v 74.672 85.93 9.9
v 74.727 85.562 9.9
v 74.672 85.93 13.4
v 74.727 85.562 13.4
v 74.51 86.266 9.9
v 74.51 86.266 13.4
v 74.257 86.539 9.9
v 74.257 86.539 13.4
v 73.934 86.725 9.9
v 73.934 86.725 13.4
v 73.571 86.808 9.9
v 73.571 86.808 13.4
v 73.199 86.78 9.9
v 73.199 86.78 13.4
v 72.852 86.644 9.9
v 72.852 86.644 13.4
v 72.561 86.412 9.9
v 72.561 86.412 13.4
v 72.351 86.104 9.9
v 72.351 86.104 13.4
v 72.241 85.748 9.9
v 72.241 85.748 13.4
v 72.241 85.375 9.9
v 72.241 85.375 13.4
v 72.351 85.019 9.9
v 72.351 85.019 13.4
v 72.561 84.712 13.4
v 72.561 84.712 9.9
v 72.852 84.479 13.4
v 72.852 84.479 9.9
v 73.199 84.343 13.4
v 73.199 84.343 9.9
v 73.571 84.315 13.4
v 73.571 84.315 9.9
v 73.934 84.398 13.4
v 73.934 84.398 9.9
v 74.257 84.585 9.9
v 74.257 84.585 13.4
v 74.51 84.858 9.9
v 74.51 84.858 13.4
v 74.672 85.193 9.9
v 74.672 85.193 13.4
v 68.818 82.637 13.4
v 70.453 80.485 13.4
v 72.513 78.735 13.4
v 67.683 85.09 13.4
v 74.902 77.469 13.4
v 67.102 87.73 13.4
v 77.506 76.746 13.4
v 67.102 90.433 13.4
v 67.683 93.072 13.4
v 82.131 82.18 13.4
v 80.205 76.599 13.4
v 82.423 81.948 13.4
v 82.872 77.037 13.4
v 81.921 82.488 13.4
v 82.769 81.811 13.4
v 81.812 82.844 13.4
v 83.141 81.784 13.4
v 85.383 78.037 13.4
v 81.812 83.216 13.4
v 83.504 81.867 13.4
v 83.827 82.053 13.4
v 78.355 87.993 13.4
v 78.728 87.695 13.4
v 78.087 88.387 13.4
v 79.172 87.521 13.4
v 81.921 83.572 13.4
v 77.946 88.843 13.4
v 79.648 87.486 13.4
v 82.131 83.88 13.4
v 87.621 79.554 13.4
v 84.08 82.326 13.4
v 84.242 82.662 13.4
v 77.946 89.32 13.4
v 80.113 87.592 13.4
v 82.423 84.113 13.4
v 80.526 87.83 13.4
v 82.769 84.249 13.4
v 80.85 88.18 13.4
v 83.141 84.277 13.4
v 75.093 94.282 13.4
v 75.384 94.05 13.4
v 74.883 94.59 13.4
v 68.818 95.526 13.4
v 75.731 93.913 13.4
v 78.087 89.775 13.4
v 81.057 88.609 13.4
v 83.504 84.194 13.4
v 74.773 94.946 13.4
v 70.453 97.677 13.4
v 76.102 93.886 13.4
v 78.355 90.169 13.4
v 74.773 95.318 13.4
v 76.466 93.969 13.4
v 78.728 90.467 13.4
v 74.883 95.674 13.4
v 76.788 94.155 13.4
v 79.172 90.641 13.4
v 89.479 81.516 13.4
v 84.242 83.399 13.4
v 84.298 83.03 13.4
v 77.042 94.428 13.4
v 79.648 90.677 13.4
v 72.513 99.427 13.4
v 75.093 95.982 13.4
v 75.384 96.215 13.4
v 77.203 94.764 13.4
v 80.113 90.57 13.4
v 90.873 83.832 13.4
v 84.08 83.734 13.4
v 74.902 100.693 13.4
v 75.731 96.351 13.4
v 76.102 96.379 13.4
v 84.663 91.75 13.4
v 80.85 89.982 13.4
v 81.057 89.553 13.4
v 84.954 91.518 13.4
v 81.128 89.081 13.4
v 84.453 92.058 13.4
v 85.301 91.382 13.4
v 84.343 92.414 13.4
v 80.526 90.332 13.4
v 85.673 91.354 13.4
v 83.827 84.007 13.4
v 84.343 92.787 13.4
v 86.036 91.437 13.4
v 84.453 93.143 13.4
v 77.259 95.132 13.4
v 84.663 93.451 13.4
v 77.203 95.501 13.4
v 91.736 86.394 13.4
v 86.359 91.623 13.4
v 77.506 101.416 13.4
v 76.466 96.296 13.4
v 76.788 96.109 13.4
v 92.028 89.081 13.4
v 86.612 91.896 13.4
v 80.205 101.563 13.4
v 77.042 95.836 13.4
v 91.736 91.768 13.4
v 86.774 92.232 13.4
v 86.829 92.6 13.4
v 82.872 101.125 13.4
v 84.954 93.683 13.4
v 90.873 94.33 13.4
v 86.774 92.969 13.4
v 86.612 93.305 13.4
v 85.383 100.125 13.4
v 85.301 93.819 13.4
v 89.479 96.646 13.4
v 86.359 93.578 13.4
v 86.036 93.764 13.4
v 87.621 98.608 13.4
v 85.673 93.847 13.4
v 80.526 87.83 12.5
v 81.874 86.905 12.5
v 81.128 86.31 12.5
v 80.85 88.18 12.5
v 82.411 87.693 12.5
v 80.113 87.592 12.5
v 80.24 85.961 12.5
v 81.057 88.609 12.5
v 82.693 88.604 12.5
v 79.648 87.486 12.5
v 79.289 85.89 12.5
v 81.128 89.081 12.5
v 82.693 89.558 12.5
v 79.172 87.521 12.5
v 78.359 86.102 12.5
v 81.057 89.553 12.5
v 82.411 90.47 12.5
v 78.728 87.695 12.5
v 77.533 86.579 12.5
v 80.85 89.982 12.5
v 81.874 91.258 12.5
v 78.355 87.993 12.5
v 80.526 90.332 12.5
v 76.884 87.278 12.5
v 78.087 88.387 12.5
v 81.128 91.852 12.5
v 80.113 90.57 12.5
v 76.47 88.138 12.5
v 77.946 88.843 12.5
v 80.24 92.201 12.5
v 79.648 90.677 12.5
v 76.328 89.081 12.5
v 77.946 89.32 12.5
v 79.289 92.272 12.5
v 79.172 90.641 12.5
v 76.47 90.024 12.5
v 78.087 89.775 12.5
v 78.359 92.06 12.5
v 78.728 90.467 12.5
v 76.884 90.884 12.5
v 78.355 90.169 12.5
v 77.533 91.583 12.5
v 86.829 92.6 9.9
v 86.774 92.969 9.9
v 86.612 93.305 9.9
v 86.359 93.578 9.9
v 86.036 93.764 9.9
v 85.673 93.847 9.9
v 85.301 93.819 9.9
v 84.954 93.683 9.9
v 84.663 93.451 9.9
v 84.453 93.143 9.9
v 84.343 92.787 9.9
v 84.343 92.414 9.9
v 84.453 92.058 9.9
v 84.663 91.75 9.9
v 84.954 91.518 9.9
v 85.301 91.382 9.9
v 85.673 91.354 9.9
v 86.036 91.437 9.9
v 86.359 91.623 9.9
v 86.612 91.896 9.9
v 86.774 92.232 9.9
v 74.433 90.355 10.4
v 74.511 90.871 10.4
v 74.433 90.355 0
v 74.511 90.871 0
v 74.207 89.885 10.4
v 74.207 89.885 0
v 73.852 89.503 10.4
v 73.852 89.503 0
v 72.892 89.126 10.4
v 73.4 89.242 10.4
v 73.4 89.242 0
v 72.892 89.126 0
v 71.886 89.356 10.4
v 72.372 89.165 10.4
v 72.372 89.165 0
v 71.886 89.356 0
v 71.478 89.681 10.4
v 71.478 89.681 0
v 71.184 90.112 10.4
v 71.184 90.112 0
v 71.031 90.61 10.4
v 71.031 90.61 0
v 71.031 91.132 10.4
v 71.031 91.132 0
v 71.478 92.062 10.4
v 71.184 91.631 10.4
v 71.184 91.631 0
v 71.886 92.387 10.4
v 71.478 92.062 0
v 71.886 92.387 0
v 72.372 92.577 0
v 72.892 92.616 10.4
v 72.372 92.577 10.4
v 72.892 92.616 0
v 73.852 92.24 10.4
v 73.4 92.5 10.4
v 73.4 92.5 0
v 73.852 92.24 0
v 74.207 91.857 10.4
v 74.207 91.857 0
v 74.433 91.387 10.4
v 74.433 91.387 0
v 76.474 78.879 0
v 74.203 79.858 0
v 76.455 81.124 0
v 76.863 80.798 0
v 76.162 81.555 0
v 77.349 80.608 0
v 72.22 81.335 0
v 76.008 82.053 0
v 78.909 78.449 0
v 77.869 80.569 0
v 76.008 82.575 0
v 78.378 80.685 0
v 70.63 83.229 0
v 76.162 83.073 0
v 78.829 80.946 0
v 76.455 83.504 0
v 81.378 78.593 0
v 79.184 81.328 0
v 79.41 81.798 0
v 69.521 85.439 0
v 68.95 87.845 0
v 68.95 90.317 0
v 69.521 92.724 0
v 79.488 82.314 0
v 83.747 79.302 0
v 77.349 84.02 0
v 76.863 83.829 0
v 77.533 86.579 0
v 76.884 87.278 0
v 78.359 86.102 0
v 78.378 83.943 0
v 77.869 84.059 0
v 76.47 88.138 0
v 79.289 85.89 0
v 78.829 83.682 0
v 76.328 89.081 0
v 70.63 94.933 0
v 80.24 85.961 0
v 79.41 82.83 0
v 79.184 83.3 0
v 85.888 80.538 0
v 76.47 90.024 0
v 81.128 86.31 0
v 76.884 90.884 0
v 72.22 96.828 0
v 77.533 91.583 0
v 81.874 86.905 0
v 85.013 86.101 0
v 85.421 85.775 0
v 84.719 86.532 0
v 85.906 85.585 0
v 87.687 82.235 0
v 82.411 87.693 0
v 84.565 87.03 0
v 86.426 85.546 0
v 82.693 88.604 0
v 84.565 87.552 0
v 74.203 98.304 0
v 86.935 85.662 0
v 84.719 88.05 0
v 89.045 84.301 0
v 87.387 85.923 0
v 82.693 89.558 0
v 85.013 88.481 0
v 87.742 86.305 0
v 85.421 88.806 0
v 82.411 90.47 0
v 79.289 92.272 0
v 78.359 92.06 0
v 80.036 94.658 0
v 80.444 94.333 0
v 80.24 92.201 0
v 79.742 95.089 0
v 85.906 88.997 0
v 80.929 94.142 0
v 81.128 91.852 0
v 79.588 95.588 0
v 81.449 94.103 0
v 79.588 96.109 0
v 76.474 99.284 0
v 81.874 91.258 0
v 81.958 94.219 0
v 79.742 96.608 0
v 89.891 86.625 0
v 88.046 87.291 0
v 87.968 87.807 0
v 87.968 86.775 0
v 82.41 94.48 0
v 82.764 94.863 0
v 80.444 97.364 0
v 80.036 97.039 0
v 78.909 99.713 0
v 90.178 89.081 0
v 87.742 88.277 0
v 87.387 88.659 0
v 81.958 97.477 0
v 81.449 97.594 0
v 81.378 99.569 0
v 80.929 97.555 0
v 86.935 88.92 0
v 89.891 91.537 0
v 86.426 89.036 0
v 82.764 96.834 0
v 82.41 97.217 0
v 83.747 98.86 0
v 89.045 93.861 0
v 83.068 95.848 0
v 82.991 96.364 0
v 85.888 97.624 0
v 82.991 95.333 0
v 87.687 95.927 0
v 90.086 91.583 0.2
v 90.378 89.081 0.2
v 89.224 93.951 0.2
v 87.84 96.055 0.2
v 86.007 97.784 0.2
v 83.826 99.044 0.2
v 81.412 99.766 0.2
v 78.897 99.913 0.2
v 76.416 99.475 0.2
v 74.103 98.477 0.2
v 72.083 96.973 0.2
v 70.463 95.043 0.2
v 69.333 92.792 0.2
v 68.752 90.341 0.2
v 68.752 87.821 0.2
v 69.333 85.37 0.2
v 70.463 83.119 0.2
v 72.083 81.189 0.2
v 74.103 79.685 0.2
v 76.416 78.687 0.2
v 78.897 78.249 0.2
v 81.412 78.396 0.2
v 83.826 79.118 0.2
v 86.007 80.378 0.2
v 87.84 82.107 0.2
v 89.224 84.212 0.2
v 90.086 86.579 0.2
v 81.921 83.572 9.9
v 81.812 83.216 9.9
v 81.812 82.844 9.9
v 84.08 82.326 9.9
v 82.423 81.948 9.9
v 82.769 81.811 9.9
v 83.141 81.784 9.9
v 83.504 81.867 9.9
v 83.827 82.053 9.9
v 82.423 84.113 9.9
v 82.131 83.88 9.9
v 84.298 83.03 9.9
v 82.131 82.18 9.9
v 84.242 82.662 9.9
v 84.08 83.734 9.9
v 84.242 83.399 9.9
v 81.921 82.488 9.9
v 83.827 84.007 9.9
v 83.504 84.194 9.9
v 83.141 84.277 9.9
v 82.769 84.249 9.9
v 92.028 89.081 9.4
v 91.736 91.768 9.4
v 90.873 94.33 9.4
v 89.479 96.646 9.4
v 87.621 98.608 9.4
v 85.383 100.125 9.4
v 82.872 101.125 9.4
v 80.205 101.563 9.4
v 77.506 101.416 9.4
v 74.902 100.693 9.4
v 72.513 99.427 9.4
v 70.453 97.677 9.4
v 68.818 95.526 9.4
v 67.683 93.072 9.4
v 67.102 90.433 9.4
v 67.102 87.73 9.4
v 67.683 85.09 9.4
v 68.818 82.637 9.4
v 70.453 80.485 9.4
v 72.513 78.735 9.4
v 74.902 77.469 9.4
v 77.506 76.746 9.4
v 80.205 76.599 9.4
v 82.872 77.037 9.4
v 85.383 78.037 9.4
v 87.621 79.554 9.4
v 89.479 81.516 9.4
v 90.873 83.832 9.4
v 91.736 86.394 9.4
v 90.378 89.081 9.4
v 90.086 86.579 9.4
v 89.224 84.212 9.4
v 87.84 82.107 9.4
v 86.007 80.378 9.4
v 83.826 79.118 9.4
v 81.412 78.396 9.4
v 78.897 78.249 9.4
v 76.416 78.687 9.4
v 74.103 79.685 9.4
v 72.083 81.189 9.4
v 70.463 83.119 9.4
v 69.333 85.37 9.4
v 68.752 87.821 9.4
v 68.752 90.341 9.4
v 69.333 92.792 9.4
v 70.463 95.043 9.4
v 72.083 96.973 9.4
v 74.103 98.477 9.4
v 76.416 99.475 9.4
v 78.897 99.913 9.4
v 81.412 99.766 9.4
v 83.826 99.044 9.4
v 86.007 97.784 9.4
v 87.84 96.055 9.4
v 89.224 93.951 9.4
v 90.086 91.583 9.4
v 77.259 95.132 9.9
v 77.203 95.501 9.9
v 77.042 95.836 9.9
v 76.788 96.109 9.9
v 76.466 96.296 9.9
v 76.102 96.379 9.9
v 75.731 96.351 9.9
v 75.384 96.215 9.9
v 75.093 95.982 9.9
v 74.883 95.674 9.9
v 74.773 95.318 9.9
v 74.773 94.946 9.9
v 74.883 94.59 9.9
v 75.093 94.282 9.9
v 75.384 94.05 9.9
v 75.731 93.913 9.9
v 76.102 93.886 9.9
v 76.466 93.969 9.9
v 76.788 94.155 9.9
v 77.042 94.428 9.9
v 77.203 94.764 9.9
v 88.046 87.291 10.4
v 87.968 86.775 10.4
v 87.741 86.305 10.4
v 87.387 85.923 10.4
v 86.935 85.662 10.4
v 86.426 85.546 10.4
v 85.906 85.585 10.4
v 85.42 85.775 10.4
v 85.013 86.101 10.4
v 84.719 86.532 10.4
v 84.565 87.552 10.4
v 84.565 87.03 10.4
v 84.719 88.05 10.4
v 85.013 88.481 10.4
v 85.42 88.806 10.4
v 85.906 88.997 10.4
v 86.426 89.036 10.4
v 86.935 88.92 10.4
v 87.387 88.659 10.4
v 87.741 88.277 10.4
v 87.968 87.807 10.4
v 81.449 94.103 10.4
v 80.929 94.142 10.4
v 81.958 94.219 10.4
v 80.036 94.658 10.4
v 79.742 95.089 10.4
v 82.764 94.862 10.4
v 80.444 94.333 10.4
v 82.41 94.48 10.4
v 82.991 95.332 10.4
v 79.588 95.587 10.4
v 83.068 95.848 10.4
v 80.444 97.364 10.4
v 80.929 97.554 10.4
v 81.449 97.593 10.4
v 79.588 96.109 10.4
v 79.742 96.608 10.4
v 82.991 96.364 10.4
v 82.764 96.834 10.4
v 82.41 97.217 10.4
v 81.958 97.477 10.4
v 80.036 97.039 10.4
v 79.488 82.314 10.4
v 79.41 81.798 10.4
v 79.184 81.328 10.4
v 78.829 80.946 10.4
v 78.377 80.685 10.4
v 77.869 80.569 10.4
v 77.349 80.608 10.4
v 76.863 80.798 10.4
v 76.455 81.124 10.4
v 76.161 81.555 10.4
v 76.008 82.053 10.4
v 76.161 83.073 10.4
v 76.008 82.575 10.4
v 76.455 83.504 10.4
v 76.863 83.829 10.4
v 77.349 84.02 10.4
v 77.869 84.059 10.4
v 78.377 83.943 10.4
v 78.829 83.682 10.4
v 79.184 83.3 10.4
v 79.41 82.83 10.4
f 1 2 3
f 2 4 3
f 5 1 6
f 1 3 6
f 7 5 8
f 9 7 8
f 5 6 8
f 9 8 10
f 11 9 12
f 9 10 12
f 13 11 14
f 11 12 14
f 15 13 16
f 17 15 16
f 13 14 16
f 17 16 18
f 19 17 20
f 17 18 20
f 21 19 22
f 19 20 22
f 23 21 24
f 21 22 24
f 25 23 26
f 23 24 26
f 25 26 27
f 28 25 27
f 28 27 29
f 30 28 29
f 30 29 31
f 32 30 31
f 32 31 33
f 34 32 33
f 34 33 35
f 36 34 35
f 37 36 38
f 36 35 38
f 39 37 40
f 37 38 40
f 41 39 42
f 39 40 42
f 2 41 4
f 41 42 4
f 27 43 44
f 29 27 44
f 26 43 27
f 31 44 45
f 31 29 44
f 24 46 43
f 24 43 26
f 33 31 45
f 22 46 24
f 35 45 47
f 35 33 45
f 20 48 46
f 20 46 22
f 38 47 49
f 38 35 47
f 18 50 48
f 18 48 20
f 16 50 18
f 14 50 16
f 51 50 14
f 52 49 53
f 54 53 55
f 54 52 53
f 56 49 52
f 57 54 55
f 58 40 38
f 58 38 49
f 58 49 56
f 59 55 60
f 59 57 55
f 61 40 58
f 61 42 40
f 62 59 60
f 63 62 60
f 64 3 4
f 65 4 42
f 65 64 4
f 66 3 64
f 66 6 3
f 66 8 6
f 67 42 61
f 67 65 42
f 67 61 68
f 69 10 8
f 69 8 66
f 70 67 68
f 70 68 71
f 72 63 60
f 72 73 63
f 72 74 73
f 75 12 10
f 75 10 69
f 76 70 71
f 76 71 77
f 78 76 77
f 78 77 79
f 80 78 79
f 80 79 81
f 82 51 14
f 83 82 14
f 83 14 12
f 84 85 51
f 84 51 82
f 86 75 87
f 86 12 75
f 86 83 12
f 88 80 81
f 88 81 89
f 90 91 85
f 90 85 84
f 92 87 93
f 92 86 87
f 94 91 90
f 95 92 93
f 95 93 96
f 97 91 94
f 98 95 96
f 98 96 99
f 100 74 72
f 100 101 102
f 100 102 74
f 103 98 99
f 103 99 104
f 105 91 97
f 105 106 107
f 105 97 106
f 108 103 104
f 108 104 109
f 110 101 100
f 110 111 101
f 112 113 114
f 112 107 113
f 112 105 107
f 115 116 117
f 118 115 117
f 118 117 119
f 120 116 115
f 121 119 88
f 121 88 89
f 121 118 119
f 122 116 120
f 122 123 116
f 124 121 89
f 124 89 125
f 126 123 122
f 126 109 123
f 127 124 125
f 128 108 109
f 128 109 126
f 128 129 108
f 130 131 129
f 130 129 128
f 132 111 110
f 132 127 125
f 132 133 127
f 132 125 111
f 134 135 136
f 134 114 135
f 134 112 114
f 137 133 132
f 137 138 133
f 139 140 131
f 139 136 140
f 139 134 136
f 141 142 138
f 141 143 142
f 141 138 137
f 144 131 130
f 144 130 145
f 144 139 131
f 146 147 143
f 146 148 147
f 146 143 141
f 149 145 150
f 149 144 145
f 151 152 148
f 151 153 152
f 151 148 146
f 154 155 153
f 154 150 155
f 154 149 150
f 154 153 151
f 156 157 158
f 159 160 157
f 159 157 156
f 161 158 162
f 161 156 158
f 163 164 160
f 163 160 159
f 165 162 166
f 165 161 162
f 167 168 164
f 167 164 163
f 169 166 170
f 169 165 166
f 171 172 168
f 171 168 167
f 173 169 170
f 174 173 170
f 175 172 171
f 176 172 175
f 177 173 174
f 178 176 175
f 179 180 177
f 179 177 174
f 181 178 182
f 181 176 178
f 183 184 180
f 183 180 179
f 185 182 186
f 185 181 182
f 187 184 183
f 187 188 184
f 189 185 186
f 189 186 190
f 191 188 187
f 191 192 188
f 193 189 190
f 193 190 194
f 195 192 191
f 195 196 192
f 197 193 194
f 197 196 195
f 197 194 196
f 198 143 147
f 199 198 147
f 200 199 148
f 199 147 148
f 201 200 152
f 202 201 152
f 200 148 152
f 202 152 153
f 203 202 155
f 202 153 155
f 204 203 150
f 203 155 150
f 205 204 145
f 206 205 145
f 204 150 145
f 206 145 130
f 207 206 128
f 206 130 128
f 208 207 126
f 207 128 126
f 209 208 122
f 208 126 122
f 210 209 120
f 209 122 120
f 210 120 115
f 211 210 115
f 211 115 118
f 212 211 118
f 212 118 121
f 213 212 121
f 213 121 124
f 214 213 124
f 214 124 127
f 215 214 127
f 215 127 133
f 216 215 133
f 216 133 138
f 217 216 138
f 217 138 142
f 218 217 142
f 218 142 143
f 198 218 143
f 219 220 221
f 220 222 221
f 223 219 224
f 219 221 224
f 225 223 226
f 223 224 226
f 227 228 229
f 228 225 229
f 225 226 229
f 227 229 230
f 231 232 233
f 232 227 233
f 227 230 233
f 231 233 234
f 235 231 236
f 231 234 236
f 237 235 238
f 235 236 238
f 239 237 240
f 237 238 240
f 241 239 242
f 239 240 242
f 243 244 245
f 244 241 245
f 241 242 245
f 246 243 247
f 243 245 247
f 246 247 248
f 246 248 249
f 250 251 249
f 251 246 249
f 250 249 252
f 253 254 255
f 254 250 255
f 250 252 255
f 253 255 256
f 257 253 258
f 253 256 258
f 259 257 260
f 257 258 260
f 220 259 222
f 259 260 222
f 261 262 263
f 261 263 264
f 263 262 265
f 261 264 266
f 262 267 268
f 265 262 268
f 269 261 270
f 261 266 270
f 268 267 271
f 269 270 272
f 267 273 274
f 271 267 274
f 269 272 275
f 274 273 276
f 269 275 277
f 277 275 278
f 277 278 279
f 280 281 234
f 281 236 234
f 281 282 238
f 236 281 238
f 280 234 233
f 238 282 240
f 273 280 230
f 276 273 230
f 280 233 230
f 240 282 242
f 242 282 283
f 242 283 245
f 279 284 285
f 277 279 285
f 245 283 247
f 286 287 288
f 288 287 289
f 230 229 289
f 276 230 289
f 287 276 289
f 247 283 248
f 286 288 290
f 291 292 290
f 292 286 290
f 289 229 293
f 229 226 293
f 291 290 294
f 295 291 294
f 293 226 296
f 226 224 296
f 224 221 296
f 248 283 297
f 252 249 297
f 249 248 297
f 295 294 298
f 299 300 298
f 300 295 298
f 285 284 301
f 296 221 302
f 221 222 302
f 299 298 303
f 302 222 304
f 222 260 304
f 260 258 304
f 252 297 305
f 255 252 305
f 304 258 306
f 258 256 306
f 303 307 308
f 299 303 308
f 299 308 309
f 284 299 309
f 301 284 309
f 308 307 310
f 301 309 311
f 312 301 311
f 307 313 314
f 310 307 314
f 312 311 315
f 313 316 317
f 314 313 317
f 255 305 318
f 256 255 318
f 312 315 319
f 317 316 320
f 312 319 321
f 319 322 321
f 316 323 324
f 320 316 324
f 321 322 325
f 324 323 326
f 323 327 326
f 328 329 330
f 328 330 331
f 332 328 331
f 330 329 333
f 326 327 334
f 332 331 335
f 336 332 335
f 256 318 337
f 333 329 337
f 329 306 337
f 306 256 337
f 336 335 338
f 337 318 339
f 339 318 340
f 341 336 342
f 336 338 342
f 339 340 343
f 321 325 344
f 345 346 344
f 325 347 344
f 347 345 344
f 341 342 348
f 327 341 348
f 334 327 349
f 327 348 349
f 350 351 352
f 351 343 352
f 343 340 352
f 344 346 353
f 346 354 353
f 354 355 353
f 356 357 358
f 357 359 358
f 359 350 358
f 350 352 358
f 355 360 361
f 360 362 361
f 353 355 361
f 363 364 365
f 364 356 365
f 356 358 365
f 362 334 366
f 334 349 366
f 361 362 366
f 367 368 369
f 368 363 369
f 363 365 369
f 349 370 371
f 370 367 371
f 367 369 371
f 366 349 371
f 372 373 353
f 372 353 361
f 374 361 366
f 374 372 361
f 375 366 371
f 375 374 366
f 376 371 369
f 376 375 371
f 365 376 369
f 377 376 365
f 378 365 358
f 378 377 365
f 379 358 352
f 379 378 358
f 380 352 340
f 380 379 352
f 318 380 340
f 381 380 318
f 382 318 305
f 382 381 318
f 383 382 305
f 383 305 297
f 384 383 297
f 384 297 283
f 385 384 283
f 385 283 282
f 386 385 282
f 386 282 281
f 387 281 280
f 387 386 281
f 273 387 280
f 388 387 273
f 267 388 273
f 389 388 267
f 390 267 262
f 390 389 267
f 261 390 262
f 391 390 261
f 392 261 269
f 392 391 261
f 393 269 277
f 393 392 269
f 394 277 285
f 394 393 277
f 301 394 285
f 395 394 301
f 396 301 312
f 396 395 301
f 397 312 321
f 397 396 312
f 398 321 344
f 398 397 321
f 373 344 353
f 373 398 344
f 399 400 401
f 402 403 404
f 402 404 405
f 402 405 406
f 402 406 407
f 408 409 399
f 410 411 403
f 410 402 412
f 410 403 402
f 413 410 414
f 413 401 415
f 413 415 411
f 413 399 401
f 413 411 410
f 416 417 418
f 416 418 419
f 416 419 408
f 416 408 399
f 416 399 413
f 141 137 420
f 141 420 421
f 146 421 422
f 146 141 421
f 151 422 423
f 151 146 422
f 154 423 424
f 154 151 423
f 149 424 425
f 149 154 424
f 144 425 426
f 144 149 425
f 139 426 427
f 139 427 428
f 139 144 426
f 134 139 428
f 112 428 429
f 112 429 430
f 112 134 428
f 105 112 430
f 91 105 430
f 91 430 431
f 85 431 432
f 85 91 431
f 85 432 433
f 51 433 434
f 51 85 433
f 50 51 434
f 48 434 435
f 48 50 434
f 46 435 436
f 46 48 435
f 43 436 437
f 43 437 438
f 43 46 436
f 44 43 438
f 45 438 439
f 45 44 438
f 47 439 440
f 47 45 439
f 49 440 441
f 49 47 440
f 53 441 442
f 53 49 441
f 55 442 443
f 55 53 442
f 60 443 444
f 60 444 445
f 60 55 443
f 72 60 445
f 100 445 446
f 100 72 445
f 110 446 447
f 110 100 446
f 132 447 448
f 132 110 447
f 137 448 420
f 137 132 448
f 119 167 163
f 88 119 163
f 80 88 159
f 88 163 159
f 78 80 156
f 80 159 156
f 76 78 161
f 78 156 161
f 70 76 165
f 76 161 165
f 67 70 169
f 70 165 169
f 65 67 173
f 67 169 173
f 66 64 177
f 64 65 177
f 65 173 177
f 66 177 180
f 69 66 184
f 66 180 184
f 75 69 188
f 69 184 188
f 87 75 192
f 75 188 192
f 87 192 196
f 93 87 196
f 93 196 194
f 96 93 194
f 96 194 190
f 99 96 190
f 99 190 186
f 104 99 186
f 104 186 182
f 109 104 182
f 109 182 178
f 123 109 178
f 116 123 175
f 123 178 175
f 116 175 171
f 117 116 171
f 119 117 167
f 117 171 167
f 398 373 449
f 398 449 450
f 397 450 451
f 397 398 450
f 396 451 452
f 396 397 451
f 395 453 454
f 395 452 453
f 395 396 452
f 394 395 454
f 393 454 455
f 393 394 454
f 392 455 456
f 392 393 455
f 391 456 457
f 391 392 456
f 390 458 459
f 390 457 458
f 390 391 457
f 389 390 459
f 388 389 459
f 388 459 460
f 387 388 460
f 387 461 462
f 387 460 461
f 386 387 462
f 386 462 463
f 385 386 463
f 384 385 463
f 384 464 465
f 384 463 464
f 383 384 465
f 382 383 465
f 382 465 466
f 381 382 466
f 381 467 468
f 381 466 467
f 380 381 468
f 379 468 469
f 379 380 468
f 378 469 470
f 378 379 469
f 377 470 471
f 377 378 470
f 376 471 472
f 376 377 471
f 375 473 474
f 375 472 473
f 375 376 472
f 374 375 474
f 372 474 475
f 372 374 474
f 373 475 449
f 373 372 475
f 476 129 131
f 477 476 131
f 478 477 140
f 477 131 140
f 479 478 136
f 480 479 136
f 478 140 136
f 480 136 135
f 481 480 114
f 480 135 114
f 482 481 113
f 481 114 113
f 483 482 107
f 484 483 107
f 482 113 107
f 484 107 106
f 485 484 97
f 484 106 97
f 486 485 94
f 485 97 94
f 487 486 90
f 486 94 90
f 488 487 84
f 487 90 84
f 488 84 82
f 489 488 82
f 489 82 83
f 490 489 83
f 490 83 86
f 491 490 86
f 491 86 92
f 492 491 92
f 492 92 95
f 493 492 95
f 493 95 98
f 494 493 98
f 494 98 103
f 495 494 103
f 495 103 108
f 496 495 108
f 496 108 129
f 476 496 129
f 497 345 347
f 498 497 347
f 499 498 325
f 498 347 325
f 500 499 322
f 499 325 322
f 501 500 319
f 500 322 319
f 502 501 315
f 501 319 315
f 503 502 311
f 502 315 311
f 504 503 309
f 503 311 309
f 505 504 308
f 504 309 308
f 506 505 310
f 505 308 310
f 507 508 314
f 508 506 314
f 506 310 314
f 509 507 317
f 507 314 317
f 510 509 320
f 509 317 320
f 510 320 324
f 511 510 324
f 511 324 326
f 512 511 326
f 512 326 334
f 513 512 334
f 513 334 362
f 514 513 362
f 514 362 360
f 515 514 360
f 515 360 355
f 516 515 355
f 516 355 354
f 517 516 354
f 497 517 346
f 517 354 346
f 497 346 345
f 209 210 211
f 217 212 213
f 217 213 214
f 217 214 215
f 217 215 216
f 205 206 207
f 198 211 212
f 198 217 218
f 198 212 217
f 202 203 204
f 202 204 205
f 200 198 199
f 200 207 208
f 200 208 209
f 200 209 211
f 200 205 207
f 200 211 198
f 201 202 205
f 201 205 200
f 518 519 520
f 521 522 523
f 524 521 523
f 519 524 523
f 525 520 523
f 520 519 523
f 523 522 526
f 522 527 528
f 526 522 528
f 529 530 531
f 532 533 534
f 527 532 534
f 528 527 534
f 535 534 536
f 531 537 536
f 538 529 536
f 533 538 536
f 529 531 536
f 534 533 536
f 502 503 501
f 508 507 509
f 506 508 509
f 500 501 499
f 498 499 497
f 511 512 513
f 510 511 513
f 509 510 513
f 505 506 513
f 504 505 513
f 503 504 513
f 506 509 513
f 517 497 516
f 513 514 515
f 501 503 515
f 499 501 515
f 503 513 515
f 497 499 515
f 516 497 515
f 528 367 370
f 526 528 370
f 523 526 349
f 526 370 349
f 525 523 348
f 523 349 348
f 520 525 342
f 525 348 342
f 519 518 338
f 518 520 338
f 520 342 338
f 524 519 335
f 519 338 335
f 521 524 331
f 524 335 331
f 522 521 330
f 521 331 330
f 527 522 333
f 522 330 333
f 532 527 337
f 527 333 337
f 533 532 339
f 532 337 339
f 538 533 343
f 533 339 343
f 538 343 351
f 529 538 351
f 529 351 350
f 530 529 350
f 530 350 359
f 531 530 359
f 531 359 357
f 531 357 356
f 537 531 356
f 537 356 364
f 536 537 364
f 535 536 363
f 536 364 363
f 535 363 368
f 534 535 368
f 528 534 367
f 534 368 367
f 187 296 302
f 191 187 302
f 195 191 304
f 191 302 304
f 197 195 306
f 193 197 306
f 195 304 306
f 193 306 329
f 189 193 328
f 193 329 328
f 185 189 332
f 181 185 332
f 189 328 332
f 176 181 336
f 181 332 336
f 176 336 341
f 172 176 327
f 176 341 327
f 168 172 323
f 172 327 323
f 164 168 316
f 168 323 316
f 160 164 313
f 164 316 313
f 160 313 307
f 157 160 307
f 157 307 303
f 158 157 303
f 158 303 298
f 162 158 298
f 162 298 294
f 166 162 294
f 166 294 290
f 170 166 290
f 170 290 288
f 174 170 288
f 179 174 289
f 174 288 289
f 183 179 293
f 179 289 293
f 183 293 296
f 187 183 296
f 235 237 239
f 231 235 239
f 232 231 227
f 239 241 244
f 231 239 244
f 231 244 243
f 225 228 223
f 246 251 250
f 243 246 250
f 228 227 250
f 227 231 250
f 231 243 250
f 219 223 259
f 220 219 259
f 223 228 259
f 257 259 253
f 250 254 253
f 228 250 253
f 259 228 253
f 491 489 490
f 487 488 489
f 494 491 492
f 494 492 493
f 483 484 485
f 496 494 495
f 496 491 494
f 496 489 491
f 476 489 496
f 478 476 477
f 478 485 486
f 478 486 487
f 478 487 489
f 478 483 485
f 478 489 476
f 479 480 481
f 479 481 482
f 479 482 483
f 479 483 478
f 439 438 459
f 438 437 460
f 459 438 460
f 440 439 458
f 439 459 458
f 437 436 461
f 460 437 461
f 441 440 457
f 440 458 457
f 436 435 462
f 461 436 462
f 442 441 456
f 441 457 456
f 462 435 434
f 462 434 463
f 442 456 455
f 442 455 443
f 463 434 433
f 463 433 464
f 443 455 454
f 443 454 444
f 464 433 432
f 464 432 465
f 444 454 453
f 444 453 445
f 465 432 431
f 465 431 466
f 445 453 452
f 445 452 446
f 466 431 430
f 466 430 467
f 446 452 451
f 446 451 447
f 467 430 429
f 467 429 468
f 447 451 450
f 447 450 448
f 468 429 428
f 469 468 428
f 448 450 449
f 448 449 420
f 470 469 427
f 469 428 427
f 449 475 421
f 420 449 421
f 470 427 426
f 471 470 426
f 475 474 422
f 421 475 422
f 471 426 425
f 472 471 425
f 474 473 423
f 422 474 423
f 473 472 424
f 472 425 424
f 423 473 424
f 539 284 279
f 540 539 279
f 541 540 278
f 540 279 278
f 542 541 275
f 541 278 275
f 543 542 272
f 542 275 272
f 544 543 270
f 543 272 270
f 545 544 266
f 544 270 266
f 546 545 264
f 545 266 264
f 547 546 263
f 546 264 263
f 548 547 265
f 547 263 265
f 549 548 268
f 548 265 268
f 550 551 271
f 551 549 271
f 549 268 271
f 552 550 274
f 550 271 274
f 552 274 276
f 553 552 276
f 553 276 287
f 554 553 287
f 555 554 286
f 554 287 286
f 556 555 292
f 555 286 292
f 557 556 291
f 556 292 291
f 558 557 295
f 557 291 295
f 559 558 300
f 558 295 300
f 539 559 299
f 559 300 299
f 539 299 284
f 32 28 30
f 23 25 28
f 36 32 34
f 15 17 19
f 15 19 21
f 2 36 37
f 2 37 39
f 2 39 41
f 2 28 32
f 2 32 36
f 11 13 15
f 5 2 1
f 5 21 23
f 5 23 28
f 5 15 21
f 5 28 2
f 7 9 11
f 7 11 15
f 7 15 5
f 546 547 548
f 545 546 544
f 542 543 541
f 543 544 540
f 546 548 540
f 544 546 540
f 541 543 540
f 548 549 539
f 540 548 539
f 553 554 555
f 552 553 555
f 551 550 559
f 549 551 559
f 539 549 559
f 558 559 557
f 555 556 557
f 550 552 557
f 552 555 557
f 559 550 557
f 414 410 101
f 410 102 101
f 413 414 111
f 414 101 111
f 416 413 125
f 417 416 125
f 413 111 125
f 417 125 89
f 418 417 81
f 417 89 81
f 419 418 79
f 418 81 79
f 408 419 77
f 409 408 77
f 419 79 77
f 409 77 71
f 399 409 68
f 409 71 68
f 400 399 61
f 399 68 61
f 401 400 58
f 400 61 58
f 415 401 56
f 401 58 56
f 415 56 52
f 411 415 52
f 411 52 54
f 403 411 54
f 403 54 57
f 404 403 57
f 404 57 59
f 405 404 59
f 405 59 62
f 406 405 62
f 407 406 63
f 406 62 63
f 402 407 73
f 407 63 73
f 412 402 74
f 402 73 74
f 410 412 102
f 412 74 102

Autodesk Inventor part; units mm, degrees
ref_plane "YZ Plane" through (0, 0, 0) normal (1, 0, 0) x (0, 1, 0)
ref_plane "XZ Plane" through (0, 0, 0) normal (0, 1, 0) x (-1, 0, 0)
ref_plane "XY Plane" through (0, 0, 0) normal (0, 0, 1) x (1, 0, 0)
sketch "스케치1" plane through (0, 0, 0) normal (0, 0, 1) x (1, 0, 0)
  circle A0 centre (77.7382, 82.3139) radius 1.75 projected
  circle A1 centre (72.7611, 90.8713) radius 1.75 projected
  circle A2 centre (86.2956, 87.2909) radius 1.75 projected
  circle A3 centre (81.3185, 95.8484) radius 1.75 projected
  circle A4 centre (79.5283, 89.0811) radius 11.15 projected
  circle A5 centre (79.5283, 89.0811) radius 10.85
  circle A6 centre (79.5283, 89.0811) radius 1.6
  circle A7 centre (79.5283, 89.0811) radius 2.8
  circle A8 centre (79.5283, 89.0811) radius 2.5 projected
  point P0 (0, 0)
  dimension "d0" = 0.3
  dimension "d3" = 3.2
extrude "돌출1" add sketch "스케치1" along normal blind 13.4 contours A5 | A7 | A8
sketch "스케치2" plane through (79.5283, 89.0811, 13.4) normal (0, 0, 1) x (1, 0, 0)
  circle A0 centre (0, 0) radius 10.85 projected
  circle A1 centre (0, 0) radius 12.5
  dimension "d4" = 25
extrude "돌출2" add sketch "스케치2" against normal blind 4
chamfer "모따기1" distance 0.2 angle 45 1 edges at (68.6783, 89.0811, 0)
sketch "스케치3" plane through (79.5283, 89.0811, 0) normal (0, 0, -1) x (-1, 0, 0)
  circle A0 centre (0, 0) radius 1.6 projected
  circle A1 centre (0, 0) radius 10.65 projected
  circle A2 centre (0, 0) radius 3.2
  dimension "d13" = 6.4
extrude "돌출3" cut sketch "스케치3" against normal blind 12.5 contours A2
sketch "스케치5" plane through (79.5283, 89.0811, 13.4) normal (0, 0, 1) x (1, 0, 0)
  circle A0 centre (0, 0) radius 12.5 projected
  circle A1 centre (-1.7902, -6.7672) radius 1.75 projected
  circle A2 centre (-1.7902, -6.7672) radius 1.25
  circle A3 centre (3.5193, -6.051) radius 1.25
  circle A4 centre (6.7672, -1.7902) radius 1.25
  circle A5 centre (6.051, 3.5193) radius 1.25
  circle A6 centre (1.7902, 6.7672) radius 1.25
  circle A7 centre (-3.5193, 6.051) radius 1.25
  circle A8 centre (-6.7672, 1.7902) radius 1.25
  circle A9 centre (-6.051, -3.5193) radius 1.25
  dimension "d18" = 2.5
  dimension "d21" = 360
extrude "돌출5" cut sketch "스케치5" against normal blind 3.5 contours A3 | A5 | A7 | A9
sketch "스케치4" plane through (79.5283, 89.0811, 13.4) normal (0, 0, 1) x (1, 0, 0)
  circle A0 centre (1.7902, 6.7672) radius 1.75 projected
  circle A1 centre (6.7672, -1.7902) radius 1.75 projected
  circle A2 centre (-6.7672, 1.7902) radius 1.75 projected
  circle A3 centre (-1.7902, -6.7672) radius 1.75 projected
extrude "돌출4" add sketch "스케치4" against normal blind 3
properties part number "gear_support" material "고무, 검은색"
